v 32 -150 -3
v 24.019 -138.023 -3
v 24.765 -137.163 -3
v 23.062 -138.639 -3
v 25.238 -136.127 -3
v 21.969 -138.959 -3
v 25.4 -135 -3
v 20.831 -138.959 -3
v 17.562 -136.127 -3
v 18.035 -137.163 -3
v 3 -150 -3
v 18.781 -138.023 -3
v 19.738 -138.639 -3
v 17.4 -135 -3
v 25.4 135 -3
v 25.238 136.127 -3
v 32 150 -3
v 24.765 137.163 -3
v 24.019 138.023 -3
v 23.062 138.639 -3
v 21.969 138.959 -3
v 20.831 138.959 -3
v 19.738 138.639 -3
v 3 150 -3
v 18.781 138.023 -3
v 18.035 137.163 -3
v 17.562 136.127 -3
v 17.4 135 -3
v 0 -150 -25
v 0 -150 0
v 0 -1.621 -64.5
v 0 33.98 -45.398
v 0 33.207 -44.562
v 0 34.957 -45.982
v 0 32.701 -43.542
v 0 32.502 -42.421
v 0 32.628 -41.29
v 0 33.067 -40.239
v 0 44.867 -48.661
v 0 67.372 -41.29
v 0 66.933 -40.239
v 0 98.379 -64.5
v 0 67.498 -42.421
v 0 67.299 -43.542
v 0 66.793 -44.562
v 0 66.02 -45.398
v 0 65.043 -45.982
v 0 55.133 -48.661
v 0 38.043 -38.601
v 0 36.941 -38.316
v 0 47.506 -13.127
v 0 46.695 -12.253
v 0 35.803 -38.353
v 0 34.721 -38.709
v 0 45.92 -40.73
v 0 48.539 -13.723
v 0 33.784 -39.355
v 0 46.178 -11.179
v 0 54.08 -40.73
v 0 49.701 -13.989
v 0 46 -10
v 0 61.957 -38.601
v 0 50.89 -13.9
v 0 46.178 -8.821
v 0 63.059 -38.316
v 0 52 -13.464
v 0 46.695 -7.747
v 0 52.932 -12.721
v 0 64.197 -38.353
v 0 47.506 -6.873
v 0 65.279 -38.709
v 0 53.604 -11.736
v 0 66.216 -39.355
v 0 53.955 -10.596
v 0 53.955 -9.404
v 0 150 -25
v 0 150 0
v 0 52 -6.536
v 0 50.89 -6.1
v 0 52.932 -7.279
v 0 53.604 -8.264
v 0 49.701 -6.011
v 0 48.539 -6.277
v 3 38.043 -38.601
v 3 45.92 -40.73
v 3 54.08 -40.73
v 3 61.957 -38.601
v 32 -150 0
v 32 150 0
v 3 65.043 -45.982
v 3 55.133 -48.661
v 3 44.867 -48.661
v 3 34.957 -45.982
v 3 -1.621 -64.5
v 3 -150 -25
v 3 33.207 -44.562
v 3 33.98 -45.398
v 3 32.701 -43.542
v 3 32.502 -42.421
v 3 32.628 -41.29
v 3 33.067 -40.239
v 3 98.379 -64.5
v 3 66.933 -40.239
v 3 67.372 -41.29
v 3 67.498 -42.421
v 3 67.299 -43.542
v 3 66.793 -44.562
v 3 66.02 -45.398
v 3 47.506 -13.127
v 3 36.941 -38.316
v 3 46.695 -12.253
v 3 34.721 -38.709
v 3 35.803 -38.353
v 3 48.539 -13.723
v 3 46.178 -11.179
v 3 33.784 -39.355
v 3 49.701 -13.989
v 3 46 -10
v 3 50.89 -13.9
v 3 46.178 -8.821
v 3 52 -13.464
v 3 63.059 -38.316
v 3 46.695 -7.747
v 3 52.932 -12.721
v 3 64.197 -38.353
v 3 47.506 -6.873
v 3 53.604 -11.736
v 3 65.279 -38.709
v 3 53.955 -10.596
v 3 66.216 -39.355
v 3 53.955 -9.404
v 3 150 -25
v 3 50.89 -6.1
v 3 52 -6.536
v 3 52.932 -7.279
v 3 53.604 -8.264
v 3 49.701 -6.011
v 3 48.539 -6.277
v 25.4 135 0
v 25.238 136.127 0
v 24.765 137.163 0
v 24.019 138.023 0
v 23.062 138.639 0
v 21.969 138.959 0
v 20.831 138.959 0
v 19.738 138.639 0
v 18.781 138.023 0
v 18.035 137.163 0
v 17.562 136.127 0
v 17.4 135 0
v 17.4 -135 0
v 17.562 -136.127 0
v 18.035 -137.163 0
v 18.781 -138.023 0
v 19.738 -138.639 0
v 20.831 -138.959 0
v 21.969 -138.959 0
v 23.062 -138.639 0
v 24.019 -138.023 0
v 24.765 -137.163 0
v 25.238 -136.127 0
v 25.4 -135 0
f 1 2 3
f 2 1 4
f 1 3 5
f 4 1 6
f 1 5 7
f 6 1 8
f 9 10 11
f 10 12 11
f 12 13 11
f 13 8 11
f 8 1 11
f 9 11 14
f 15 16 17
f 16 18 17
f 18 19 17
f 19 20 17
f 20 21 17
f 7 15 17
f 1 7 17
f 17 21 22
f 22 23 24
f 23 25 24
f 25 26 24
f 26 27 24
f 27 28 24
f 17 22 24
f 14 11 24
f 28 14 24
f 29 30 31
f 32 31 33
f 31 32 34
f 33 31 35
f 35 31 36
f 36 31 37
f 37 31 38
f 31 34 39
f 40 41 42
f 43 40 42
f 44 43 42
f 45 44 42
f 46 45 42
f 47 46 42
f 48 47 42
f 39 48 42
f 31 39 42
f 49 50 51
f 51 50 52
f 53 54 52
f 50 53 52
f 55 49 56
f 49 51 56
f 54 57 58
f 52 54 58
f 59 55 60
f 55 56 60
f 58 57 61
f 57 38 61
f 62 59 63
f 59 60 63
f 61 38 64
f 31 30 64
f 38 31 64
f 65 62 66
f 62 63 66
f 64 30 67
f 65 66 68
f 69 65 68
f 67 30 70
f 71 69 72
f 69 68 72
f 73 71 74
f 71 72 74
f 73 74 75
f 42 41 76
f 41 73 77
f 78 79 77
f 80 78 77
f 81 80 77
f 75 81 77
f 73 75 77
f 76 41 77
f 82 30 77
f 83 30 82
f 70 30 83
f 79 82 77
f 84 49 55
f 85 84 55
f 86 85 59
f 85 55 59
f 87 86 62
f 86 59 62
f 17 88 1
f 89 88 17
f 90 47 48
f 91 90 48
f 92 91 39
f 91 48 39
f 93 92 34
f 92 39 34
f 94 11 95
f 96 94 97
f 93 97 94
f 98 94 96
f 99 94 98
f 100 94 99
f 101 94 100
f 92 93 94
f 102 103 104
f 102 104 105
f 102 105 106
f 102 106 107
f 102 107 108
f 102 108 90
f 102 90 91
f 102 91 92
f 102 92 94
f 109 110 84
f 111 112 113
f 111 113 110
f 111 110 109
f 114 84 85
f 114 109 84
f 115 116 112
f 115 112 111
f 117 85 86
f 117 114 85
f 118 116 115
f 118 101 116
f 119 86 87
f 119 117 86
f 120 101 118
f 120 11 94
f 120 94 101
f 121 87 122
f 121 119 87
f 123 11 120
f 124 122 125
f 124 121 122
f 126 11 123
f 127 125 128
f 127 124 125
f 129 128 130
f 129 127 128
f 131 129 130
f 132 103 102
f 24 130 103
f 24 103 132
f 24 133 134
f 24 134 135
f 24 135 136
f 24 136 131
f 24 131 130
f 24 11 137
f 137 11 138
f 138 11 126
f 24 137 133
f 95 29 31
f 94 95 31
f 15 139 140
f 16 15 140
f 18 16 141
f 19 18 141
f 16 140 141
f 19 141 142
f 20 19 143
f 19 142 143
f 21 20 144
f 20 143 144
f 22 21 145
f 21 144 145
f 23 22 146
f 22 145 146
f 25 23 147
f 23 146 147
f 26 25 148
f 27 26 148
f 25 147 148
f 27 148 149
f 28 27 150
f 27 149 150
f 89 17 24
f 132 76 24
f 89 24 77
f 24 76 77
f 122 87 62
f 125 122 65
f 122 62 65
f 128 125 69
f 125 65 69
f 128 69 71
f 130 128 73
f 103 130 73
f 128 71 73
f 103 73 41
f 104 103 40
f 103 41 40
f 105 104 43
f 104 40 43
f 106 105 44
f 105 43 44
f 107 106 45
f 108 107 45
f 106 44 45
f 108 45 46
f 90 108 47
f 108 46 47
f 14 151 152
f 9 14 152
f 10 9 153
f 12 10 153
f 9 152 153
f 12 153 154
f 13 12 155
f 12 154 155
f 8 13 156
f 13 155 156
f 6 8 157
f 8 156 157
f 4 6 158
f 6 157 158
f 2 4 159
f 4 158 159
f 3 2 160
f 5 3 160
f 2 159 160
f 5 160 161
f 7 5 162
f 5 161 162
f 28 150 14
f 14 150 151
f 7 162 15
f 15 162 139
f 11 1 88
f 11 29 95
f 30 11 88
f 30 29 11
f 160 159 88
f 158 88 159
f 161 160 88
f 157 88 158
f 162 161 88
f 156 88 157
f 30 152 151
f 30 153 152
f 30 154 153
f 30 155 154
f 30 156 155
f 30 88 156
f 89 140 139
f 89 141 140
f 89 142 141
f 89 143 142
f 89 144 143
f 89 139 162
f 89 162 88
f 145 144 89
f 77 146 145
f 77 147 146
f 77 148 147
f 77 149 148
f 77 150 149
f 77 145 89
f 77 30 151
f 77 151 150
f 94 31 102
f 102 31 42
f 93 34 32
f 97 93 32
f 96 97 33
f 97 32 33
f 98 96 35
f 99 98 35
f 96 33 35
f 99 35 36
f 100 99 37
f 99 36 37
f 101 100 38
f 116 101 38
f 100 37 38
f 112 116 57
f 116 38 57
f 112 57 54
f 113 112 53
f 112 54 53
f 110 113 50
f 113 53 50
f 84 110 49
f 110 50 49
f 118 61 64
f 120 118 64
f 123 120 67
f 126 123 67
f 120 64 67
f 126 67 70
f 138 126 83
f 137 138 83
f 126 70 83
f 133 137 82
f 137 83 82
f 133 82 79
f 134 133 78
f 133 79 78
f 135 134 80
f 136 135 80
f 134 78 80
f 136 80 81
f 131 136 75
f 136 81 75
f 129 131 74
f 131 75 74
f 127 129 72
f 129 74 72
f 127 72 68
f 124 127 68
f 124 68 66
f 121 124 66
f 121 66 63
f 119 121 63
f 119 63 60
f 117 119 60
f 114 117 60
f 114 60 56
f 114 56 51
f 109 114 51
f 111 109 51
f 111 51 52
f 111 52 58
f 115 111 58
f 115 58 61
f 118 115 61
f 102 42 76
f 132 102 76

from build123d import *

# Parameters (mm, degrees)
F1_DEPTH = 3
F2_W     = 300
F2_H     = 3
F3_DEPTH = 29
F5_DEPTH = 64.501
F6_R     = 4
F7_DEPTH = 32.001


with BuildPart() as f1:
    # F0 (on Right) → F1 (new body)
    with BuildSketch(Plane.YZ):
        Polygon((150, -25), (150, 0), (-150, 0), (-150, -25), (-1.621217, -64.5), (98.378783, -64.5), align=None)
    extrude(amount=F1_DEPTH)

    # F2 (on face) → F3 (join)
    with BuildSketch(Plane.YZ.offset(3)):
        with Locations((0, -1.5)):
            Rectangle(F2_W, F2_H)
    extrude(amount=F3_DEPTH)

    # F4 (on face) → F5 (cut, through all)
    with BuildSketch(Plane.XY):
        with BuildLine():
            ThreePointArc((17.4, -135), (21.4, -139), (25.4, -135))
            Line((25.4, -135), (25.4, 135))
            ThreePointArc((25.4, 135), (21.4, 139), (17.4, 135))
            Line((17.4, 135), (17.4, -135))
        make_face()
    extrude(amount=-F5_DEPTH, mode=Mode.SUBTRACT)

    # F6 (on face) → F7 (cut, through all)
    with BuildSketch(Plane(origin=(0, 0, 0), x_dir=(0, -1, 0), z_dir=(-1, 0, 0))):
        with Locations((-50, -10)):
            Circle(F6_R)
        with BuildLine():
            ThreePointArc((-61.957143, -38.601167), (-67.190473, -40.748783), (-65.042857, -45.982113))
            ThreePointArc((-65.042857, -45.982113), (-50, -49), (-34.957143, -45.982113))
            ThreePointArc((-34.957143, -45.982113), (-32.809527, -40.748783), (-38.042857, -38.601167))
            ThreePointArc((-38.042857, -38.601167), (-50, -41), (-61.957143, -38.601167))
        make_face()
    extrude(amount=-F7_DEPTH, mode=Mode.SUBTRACT)


solid = f1.part
